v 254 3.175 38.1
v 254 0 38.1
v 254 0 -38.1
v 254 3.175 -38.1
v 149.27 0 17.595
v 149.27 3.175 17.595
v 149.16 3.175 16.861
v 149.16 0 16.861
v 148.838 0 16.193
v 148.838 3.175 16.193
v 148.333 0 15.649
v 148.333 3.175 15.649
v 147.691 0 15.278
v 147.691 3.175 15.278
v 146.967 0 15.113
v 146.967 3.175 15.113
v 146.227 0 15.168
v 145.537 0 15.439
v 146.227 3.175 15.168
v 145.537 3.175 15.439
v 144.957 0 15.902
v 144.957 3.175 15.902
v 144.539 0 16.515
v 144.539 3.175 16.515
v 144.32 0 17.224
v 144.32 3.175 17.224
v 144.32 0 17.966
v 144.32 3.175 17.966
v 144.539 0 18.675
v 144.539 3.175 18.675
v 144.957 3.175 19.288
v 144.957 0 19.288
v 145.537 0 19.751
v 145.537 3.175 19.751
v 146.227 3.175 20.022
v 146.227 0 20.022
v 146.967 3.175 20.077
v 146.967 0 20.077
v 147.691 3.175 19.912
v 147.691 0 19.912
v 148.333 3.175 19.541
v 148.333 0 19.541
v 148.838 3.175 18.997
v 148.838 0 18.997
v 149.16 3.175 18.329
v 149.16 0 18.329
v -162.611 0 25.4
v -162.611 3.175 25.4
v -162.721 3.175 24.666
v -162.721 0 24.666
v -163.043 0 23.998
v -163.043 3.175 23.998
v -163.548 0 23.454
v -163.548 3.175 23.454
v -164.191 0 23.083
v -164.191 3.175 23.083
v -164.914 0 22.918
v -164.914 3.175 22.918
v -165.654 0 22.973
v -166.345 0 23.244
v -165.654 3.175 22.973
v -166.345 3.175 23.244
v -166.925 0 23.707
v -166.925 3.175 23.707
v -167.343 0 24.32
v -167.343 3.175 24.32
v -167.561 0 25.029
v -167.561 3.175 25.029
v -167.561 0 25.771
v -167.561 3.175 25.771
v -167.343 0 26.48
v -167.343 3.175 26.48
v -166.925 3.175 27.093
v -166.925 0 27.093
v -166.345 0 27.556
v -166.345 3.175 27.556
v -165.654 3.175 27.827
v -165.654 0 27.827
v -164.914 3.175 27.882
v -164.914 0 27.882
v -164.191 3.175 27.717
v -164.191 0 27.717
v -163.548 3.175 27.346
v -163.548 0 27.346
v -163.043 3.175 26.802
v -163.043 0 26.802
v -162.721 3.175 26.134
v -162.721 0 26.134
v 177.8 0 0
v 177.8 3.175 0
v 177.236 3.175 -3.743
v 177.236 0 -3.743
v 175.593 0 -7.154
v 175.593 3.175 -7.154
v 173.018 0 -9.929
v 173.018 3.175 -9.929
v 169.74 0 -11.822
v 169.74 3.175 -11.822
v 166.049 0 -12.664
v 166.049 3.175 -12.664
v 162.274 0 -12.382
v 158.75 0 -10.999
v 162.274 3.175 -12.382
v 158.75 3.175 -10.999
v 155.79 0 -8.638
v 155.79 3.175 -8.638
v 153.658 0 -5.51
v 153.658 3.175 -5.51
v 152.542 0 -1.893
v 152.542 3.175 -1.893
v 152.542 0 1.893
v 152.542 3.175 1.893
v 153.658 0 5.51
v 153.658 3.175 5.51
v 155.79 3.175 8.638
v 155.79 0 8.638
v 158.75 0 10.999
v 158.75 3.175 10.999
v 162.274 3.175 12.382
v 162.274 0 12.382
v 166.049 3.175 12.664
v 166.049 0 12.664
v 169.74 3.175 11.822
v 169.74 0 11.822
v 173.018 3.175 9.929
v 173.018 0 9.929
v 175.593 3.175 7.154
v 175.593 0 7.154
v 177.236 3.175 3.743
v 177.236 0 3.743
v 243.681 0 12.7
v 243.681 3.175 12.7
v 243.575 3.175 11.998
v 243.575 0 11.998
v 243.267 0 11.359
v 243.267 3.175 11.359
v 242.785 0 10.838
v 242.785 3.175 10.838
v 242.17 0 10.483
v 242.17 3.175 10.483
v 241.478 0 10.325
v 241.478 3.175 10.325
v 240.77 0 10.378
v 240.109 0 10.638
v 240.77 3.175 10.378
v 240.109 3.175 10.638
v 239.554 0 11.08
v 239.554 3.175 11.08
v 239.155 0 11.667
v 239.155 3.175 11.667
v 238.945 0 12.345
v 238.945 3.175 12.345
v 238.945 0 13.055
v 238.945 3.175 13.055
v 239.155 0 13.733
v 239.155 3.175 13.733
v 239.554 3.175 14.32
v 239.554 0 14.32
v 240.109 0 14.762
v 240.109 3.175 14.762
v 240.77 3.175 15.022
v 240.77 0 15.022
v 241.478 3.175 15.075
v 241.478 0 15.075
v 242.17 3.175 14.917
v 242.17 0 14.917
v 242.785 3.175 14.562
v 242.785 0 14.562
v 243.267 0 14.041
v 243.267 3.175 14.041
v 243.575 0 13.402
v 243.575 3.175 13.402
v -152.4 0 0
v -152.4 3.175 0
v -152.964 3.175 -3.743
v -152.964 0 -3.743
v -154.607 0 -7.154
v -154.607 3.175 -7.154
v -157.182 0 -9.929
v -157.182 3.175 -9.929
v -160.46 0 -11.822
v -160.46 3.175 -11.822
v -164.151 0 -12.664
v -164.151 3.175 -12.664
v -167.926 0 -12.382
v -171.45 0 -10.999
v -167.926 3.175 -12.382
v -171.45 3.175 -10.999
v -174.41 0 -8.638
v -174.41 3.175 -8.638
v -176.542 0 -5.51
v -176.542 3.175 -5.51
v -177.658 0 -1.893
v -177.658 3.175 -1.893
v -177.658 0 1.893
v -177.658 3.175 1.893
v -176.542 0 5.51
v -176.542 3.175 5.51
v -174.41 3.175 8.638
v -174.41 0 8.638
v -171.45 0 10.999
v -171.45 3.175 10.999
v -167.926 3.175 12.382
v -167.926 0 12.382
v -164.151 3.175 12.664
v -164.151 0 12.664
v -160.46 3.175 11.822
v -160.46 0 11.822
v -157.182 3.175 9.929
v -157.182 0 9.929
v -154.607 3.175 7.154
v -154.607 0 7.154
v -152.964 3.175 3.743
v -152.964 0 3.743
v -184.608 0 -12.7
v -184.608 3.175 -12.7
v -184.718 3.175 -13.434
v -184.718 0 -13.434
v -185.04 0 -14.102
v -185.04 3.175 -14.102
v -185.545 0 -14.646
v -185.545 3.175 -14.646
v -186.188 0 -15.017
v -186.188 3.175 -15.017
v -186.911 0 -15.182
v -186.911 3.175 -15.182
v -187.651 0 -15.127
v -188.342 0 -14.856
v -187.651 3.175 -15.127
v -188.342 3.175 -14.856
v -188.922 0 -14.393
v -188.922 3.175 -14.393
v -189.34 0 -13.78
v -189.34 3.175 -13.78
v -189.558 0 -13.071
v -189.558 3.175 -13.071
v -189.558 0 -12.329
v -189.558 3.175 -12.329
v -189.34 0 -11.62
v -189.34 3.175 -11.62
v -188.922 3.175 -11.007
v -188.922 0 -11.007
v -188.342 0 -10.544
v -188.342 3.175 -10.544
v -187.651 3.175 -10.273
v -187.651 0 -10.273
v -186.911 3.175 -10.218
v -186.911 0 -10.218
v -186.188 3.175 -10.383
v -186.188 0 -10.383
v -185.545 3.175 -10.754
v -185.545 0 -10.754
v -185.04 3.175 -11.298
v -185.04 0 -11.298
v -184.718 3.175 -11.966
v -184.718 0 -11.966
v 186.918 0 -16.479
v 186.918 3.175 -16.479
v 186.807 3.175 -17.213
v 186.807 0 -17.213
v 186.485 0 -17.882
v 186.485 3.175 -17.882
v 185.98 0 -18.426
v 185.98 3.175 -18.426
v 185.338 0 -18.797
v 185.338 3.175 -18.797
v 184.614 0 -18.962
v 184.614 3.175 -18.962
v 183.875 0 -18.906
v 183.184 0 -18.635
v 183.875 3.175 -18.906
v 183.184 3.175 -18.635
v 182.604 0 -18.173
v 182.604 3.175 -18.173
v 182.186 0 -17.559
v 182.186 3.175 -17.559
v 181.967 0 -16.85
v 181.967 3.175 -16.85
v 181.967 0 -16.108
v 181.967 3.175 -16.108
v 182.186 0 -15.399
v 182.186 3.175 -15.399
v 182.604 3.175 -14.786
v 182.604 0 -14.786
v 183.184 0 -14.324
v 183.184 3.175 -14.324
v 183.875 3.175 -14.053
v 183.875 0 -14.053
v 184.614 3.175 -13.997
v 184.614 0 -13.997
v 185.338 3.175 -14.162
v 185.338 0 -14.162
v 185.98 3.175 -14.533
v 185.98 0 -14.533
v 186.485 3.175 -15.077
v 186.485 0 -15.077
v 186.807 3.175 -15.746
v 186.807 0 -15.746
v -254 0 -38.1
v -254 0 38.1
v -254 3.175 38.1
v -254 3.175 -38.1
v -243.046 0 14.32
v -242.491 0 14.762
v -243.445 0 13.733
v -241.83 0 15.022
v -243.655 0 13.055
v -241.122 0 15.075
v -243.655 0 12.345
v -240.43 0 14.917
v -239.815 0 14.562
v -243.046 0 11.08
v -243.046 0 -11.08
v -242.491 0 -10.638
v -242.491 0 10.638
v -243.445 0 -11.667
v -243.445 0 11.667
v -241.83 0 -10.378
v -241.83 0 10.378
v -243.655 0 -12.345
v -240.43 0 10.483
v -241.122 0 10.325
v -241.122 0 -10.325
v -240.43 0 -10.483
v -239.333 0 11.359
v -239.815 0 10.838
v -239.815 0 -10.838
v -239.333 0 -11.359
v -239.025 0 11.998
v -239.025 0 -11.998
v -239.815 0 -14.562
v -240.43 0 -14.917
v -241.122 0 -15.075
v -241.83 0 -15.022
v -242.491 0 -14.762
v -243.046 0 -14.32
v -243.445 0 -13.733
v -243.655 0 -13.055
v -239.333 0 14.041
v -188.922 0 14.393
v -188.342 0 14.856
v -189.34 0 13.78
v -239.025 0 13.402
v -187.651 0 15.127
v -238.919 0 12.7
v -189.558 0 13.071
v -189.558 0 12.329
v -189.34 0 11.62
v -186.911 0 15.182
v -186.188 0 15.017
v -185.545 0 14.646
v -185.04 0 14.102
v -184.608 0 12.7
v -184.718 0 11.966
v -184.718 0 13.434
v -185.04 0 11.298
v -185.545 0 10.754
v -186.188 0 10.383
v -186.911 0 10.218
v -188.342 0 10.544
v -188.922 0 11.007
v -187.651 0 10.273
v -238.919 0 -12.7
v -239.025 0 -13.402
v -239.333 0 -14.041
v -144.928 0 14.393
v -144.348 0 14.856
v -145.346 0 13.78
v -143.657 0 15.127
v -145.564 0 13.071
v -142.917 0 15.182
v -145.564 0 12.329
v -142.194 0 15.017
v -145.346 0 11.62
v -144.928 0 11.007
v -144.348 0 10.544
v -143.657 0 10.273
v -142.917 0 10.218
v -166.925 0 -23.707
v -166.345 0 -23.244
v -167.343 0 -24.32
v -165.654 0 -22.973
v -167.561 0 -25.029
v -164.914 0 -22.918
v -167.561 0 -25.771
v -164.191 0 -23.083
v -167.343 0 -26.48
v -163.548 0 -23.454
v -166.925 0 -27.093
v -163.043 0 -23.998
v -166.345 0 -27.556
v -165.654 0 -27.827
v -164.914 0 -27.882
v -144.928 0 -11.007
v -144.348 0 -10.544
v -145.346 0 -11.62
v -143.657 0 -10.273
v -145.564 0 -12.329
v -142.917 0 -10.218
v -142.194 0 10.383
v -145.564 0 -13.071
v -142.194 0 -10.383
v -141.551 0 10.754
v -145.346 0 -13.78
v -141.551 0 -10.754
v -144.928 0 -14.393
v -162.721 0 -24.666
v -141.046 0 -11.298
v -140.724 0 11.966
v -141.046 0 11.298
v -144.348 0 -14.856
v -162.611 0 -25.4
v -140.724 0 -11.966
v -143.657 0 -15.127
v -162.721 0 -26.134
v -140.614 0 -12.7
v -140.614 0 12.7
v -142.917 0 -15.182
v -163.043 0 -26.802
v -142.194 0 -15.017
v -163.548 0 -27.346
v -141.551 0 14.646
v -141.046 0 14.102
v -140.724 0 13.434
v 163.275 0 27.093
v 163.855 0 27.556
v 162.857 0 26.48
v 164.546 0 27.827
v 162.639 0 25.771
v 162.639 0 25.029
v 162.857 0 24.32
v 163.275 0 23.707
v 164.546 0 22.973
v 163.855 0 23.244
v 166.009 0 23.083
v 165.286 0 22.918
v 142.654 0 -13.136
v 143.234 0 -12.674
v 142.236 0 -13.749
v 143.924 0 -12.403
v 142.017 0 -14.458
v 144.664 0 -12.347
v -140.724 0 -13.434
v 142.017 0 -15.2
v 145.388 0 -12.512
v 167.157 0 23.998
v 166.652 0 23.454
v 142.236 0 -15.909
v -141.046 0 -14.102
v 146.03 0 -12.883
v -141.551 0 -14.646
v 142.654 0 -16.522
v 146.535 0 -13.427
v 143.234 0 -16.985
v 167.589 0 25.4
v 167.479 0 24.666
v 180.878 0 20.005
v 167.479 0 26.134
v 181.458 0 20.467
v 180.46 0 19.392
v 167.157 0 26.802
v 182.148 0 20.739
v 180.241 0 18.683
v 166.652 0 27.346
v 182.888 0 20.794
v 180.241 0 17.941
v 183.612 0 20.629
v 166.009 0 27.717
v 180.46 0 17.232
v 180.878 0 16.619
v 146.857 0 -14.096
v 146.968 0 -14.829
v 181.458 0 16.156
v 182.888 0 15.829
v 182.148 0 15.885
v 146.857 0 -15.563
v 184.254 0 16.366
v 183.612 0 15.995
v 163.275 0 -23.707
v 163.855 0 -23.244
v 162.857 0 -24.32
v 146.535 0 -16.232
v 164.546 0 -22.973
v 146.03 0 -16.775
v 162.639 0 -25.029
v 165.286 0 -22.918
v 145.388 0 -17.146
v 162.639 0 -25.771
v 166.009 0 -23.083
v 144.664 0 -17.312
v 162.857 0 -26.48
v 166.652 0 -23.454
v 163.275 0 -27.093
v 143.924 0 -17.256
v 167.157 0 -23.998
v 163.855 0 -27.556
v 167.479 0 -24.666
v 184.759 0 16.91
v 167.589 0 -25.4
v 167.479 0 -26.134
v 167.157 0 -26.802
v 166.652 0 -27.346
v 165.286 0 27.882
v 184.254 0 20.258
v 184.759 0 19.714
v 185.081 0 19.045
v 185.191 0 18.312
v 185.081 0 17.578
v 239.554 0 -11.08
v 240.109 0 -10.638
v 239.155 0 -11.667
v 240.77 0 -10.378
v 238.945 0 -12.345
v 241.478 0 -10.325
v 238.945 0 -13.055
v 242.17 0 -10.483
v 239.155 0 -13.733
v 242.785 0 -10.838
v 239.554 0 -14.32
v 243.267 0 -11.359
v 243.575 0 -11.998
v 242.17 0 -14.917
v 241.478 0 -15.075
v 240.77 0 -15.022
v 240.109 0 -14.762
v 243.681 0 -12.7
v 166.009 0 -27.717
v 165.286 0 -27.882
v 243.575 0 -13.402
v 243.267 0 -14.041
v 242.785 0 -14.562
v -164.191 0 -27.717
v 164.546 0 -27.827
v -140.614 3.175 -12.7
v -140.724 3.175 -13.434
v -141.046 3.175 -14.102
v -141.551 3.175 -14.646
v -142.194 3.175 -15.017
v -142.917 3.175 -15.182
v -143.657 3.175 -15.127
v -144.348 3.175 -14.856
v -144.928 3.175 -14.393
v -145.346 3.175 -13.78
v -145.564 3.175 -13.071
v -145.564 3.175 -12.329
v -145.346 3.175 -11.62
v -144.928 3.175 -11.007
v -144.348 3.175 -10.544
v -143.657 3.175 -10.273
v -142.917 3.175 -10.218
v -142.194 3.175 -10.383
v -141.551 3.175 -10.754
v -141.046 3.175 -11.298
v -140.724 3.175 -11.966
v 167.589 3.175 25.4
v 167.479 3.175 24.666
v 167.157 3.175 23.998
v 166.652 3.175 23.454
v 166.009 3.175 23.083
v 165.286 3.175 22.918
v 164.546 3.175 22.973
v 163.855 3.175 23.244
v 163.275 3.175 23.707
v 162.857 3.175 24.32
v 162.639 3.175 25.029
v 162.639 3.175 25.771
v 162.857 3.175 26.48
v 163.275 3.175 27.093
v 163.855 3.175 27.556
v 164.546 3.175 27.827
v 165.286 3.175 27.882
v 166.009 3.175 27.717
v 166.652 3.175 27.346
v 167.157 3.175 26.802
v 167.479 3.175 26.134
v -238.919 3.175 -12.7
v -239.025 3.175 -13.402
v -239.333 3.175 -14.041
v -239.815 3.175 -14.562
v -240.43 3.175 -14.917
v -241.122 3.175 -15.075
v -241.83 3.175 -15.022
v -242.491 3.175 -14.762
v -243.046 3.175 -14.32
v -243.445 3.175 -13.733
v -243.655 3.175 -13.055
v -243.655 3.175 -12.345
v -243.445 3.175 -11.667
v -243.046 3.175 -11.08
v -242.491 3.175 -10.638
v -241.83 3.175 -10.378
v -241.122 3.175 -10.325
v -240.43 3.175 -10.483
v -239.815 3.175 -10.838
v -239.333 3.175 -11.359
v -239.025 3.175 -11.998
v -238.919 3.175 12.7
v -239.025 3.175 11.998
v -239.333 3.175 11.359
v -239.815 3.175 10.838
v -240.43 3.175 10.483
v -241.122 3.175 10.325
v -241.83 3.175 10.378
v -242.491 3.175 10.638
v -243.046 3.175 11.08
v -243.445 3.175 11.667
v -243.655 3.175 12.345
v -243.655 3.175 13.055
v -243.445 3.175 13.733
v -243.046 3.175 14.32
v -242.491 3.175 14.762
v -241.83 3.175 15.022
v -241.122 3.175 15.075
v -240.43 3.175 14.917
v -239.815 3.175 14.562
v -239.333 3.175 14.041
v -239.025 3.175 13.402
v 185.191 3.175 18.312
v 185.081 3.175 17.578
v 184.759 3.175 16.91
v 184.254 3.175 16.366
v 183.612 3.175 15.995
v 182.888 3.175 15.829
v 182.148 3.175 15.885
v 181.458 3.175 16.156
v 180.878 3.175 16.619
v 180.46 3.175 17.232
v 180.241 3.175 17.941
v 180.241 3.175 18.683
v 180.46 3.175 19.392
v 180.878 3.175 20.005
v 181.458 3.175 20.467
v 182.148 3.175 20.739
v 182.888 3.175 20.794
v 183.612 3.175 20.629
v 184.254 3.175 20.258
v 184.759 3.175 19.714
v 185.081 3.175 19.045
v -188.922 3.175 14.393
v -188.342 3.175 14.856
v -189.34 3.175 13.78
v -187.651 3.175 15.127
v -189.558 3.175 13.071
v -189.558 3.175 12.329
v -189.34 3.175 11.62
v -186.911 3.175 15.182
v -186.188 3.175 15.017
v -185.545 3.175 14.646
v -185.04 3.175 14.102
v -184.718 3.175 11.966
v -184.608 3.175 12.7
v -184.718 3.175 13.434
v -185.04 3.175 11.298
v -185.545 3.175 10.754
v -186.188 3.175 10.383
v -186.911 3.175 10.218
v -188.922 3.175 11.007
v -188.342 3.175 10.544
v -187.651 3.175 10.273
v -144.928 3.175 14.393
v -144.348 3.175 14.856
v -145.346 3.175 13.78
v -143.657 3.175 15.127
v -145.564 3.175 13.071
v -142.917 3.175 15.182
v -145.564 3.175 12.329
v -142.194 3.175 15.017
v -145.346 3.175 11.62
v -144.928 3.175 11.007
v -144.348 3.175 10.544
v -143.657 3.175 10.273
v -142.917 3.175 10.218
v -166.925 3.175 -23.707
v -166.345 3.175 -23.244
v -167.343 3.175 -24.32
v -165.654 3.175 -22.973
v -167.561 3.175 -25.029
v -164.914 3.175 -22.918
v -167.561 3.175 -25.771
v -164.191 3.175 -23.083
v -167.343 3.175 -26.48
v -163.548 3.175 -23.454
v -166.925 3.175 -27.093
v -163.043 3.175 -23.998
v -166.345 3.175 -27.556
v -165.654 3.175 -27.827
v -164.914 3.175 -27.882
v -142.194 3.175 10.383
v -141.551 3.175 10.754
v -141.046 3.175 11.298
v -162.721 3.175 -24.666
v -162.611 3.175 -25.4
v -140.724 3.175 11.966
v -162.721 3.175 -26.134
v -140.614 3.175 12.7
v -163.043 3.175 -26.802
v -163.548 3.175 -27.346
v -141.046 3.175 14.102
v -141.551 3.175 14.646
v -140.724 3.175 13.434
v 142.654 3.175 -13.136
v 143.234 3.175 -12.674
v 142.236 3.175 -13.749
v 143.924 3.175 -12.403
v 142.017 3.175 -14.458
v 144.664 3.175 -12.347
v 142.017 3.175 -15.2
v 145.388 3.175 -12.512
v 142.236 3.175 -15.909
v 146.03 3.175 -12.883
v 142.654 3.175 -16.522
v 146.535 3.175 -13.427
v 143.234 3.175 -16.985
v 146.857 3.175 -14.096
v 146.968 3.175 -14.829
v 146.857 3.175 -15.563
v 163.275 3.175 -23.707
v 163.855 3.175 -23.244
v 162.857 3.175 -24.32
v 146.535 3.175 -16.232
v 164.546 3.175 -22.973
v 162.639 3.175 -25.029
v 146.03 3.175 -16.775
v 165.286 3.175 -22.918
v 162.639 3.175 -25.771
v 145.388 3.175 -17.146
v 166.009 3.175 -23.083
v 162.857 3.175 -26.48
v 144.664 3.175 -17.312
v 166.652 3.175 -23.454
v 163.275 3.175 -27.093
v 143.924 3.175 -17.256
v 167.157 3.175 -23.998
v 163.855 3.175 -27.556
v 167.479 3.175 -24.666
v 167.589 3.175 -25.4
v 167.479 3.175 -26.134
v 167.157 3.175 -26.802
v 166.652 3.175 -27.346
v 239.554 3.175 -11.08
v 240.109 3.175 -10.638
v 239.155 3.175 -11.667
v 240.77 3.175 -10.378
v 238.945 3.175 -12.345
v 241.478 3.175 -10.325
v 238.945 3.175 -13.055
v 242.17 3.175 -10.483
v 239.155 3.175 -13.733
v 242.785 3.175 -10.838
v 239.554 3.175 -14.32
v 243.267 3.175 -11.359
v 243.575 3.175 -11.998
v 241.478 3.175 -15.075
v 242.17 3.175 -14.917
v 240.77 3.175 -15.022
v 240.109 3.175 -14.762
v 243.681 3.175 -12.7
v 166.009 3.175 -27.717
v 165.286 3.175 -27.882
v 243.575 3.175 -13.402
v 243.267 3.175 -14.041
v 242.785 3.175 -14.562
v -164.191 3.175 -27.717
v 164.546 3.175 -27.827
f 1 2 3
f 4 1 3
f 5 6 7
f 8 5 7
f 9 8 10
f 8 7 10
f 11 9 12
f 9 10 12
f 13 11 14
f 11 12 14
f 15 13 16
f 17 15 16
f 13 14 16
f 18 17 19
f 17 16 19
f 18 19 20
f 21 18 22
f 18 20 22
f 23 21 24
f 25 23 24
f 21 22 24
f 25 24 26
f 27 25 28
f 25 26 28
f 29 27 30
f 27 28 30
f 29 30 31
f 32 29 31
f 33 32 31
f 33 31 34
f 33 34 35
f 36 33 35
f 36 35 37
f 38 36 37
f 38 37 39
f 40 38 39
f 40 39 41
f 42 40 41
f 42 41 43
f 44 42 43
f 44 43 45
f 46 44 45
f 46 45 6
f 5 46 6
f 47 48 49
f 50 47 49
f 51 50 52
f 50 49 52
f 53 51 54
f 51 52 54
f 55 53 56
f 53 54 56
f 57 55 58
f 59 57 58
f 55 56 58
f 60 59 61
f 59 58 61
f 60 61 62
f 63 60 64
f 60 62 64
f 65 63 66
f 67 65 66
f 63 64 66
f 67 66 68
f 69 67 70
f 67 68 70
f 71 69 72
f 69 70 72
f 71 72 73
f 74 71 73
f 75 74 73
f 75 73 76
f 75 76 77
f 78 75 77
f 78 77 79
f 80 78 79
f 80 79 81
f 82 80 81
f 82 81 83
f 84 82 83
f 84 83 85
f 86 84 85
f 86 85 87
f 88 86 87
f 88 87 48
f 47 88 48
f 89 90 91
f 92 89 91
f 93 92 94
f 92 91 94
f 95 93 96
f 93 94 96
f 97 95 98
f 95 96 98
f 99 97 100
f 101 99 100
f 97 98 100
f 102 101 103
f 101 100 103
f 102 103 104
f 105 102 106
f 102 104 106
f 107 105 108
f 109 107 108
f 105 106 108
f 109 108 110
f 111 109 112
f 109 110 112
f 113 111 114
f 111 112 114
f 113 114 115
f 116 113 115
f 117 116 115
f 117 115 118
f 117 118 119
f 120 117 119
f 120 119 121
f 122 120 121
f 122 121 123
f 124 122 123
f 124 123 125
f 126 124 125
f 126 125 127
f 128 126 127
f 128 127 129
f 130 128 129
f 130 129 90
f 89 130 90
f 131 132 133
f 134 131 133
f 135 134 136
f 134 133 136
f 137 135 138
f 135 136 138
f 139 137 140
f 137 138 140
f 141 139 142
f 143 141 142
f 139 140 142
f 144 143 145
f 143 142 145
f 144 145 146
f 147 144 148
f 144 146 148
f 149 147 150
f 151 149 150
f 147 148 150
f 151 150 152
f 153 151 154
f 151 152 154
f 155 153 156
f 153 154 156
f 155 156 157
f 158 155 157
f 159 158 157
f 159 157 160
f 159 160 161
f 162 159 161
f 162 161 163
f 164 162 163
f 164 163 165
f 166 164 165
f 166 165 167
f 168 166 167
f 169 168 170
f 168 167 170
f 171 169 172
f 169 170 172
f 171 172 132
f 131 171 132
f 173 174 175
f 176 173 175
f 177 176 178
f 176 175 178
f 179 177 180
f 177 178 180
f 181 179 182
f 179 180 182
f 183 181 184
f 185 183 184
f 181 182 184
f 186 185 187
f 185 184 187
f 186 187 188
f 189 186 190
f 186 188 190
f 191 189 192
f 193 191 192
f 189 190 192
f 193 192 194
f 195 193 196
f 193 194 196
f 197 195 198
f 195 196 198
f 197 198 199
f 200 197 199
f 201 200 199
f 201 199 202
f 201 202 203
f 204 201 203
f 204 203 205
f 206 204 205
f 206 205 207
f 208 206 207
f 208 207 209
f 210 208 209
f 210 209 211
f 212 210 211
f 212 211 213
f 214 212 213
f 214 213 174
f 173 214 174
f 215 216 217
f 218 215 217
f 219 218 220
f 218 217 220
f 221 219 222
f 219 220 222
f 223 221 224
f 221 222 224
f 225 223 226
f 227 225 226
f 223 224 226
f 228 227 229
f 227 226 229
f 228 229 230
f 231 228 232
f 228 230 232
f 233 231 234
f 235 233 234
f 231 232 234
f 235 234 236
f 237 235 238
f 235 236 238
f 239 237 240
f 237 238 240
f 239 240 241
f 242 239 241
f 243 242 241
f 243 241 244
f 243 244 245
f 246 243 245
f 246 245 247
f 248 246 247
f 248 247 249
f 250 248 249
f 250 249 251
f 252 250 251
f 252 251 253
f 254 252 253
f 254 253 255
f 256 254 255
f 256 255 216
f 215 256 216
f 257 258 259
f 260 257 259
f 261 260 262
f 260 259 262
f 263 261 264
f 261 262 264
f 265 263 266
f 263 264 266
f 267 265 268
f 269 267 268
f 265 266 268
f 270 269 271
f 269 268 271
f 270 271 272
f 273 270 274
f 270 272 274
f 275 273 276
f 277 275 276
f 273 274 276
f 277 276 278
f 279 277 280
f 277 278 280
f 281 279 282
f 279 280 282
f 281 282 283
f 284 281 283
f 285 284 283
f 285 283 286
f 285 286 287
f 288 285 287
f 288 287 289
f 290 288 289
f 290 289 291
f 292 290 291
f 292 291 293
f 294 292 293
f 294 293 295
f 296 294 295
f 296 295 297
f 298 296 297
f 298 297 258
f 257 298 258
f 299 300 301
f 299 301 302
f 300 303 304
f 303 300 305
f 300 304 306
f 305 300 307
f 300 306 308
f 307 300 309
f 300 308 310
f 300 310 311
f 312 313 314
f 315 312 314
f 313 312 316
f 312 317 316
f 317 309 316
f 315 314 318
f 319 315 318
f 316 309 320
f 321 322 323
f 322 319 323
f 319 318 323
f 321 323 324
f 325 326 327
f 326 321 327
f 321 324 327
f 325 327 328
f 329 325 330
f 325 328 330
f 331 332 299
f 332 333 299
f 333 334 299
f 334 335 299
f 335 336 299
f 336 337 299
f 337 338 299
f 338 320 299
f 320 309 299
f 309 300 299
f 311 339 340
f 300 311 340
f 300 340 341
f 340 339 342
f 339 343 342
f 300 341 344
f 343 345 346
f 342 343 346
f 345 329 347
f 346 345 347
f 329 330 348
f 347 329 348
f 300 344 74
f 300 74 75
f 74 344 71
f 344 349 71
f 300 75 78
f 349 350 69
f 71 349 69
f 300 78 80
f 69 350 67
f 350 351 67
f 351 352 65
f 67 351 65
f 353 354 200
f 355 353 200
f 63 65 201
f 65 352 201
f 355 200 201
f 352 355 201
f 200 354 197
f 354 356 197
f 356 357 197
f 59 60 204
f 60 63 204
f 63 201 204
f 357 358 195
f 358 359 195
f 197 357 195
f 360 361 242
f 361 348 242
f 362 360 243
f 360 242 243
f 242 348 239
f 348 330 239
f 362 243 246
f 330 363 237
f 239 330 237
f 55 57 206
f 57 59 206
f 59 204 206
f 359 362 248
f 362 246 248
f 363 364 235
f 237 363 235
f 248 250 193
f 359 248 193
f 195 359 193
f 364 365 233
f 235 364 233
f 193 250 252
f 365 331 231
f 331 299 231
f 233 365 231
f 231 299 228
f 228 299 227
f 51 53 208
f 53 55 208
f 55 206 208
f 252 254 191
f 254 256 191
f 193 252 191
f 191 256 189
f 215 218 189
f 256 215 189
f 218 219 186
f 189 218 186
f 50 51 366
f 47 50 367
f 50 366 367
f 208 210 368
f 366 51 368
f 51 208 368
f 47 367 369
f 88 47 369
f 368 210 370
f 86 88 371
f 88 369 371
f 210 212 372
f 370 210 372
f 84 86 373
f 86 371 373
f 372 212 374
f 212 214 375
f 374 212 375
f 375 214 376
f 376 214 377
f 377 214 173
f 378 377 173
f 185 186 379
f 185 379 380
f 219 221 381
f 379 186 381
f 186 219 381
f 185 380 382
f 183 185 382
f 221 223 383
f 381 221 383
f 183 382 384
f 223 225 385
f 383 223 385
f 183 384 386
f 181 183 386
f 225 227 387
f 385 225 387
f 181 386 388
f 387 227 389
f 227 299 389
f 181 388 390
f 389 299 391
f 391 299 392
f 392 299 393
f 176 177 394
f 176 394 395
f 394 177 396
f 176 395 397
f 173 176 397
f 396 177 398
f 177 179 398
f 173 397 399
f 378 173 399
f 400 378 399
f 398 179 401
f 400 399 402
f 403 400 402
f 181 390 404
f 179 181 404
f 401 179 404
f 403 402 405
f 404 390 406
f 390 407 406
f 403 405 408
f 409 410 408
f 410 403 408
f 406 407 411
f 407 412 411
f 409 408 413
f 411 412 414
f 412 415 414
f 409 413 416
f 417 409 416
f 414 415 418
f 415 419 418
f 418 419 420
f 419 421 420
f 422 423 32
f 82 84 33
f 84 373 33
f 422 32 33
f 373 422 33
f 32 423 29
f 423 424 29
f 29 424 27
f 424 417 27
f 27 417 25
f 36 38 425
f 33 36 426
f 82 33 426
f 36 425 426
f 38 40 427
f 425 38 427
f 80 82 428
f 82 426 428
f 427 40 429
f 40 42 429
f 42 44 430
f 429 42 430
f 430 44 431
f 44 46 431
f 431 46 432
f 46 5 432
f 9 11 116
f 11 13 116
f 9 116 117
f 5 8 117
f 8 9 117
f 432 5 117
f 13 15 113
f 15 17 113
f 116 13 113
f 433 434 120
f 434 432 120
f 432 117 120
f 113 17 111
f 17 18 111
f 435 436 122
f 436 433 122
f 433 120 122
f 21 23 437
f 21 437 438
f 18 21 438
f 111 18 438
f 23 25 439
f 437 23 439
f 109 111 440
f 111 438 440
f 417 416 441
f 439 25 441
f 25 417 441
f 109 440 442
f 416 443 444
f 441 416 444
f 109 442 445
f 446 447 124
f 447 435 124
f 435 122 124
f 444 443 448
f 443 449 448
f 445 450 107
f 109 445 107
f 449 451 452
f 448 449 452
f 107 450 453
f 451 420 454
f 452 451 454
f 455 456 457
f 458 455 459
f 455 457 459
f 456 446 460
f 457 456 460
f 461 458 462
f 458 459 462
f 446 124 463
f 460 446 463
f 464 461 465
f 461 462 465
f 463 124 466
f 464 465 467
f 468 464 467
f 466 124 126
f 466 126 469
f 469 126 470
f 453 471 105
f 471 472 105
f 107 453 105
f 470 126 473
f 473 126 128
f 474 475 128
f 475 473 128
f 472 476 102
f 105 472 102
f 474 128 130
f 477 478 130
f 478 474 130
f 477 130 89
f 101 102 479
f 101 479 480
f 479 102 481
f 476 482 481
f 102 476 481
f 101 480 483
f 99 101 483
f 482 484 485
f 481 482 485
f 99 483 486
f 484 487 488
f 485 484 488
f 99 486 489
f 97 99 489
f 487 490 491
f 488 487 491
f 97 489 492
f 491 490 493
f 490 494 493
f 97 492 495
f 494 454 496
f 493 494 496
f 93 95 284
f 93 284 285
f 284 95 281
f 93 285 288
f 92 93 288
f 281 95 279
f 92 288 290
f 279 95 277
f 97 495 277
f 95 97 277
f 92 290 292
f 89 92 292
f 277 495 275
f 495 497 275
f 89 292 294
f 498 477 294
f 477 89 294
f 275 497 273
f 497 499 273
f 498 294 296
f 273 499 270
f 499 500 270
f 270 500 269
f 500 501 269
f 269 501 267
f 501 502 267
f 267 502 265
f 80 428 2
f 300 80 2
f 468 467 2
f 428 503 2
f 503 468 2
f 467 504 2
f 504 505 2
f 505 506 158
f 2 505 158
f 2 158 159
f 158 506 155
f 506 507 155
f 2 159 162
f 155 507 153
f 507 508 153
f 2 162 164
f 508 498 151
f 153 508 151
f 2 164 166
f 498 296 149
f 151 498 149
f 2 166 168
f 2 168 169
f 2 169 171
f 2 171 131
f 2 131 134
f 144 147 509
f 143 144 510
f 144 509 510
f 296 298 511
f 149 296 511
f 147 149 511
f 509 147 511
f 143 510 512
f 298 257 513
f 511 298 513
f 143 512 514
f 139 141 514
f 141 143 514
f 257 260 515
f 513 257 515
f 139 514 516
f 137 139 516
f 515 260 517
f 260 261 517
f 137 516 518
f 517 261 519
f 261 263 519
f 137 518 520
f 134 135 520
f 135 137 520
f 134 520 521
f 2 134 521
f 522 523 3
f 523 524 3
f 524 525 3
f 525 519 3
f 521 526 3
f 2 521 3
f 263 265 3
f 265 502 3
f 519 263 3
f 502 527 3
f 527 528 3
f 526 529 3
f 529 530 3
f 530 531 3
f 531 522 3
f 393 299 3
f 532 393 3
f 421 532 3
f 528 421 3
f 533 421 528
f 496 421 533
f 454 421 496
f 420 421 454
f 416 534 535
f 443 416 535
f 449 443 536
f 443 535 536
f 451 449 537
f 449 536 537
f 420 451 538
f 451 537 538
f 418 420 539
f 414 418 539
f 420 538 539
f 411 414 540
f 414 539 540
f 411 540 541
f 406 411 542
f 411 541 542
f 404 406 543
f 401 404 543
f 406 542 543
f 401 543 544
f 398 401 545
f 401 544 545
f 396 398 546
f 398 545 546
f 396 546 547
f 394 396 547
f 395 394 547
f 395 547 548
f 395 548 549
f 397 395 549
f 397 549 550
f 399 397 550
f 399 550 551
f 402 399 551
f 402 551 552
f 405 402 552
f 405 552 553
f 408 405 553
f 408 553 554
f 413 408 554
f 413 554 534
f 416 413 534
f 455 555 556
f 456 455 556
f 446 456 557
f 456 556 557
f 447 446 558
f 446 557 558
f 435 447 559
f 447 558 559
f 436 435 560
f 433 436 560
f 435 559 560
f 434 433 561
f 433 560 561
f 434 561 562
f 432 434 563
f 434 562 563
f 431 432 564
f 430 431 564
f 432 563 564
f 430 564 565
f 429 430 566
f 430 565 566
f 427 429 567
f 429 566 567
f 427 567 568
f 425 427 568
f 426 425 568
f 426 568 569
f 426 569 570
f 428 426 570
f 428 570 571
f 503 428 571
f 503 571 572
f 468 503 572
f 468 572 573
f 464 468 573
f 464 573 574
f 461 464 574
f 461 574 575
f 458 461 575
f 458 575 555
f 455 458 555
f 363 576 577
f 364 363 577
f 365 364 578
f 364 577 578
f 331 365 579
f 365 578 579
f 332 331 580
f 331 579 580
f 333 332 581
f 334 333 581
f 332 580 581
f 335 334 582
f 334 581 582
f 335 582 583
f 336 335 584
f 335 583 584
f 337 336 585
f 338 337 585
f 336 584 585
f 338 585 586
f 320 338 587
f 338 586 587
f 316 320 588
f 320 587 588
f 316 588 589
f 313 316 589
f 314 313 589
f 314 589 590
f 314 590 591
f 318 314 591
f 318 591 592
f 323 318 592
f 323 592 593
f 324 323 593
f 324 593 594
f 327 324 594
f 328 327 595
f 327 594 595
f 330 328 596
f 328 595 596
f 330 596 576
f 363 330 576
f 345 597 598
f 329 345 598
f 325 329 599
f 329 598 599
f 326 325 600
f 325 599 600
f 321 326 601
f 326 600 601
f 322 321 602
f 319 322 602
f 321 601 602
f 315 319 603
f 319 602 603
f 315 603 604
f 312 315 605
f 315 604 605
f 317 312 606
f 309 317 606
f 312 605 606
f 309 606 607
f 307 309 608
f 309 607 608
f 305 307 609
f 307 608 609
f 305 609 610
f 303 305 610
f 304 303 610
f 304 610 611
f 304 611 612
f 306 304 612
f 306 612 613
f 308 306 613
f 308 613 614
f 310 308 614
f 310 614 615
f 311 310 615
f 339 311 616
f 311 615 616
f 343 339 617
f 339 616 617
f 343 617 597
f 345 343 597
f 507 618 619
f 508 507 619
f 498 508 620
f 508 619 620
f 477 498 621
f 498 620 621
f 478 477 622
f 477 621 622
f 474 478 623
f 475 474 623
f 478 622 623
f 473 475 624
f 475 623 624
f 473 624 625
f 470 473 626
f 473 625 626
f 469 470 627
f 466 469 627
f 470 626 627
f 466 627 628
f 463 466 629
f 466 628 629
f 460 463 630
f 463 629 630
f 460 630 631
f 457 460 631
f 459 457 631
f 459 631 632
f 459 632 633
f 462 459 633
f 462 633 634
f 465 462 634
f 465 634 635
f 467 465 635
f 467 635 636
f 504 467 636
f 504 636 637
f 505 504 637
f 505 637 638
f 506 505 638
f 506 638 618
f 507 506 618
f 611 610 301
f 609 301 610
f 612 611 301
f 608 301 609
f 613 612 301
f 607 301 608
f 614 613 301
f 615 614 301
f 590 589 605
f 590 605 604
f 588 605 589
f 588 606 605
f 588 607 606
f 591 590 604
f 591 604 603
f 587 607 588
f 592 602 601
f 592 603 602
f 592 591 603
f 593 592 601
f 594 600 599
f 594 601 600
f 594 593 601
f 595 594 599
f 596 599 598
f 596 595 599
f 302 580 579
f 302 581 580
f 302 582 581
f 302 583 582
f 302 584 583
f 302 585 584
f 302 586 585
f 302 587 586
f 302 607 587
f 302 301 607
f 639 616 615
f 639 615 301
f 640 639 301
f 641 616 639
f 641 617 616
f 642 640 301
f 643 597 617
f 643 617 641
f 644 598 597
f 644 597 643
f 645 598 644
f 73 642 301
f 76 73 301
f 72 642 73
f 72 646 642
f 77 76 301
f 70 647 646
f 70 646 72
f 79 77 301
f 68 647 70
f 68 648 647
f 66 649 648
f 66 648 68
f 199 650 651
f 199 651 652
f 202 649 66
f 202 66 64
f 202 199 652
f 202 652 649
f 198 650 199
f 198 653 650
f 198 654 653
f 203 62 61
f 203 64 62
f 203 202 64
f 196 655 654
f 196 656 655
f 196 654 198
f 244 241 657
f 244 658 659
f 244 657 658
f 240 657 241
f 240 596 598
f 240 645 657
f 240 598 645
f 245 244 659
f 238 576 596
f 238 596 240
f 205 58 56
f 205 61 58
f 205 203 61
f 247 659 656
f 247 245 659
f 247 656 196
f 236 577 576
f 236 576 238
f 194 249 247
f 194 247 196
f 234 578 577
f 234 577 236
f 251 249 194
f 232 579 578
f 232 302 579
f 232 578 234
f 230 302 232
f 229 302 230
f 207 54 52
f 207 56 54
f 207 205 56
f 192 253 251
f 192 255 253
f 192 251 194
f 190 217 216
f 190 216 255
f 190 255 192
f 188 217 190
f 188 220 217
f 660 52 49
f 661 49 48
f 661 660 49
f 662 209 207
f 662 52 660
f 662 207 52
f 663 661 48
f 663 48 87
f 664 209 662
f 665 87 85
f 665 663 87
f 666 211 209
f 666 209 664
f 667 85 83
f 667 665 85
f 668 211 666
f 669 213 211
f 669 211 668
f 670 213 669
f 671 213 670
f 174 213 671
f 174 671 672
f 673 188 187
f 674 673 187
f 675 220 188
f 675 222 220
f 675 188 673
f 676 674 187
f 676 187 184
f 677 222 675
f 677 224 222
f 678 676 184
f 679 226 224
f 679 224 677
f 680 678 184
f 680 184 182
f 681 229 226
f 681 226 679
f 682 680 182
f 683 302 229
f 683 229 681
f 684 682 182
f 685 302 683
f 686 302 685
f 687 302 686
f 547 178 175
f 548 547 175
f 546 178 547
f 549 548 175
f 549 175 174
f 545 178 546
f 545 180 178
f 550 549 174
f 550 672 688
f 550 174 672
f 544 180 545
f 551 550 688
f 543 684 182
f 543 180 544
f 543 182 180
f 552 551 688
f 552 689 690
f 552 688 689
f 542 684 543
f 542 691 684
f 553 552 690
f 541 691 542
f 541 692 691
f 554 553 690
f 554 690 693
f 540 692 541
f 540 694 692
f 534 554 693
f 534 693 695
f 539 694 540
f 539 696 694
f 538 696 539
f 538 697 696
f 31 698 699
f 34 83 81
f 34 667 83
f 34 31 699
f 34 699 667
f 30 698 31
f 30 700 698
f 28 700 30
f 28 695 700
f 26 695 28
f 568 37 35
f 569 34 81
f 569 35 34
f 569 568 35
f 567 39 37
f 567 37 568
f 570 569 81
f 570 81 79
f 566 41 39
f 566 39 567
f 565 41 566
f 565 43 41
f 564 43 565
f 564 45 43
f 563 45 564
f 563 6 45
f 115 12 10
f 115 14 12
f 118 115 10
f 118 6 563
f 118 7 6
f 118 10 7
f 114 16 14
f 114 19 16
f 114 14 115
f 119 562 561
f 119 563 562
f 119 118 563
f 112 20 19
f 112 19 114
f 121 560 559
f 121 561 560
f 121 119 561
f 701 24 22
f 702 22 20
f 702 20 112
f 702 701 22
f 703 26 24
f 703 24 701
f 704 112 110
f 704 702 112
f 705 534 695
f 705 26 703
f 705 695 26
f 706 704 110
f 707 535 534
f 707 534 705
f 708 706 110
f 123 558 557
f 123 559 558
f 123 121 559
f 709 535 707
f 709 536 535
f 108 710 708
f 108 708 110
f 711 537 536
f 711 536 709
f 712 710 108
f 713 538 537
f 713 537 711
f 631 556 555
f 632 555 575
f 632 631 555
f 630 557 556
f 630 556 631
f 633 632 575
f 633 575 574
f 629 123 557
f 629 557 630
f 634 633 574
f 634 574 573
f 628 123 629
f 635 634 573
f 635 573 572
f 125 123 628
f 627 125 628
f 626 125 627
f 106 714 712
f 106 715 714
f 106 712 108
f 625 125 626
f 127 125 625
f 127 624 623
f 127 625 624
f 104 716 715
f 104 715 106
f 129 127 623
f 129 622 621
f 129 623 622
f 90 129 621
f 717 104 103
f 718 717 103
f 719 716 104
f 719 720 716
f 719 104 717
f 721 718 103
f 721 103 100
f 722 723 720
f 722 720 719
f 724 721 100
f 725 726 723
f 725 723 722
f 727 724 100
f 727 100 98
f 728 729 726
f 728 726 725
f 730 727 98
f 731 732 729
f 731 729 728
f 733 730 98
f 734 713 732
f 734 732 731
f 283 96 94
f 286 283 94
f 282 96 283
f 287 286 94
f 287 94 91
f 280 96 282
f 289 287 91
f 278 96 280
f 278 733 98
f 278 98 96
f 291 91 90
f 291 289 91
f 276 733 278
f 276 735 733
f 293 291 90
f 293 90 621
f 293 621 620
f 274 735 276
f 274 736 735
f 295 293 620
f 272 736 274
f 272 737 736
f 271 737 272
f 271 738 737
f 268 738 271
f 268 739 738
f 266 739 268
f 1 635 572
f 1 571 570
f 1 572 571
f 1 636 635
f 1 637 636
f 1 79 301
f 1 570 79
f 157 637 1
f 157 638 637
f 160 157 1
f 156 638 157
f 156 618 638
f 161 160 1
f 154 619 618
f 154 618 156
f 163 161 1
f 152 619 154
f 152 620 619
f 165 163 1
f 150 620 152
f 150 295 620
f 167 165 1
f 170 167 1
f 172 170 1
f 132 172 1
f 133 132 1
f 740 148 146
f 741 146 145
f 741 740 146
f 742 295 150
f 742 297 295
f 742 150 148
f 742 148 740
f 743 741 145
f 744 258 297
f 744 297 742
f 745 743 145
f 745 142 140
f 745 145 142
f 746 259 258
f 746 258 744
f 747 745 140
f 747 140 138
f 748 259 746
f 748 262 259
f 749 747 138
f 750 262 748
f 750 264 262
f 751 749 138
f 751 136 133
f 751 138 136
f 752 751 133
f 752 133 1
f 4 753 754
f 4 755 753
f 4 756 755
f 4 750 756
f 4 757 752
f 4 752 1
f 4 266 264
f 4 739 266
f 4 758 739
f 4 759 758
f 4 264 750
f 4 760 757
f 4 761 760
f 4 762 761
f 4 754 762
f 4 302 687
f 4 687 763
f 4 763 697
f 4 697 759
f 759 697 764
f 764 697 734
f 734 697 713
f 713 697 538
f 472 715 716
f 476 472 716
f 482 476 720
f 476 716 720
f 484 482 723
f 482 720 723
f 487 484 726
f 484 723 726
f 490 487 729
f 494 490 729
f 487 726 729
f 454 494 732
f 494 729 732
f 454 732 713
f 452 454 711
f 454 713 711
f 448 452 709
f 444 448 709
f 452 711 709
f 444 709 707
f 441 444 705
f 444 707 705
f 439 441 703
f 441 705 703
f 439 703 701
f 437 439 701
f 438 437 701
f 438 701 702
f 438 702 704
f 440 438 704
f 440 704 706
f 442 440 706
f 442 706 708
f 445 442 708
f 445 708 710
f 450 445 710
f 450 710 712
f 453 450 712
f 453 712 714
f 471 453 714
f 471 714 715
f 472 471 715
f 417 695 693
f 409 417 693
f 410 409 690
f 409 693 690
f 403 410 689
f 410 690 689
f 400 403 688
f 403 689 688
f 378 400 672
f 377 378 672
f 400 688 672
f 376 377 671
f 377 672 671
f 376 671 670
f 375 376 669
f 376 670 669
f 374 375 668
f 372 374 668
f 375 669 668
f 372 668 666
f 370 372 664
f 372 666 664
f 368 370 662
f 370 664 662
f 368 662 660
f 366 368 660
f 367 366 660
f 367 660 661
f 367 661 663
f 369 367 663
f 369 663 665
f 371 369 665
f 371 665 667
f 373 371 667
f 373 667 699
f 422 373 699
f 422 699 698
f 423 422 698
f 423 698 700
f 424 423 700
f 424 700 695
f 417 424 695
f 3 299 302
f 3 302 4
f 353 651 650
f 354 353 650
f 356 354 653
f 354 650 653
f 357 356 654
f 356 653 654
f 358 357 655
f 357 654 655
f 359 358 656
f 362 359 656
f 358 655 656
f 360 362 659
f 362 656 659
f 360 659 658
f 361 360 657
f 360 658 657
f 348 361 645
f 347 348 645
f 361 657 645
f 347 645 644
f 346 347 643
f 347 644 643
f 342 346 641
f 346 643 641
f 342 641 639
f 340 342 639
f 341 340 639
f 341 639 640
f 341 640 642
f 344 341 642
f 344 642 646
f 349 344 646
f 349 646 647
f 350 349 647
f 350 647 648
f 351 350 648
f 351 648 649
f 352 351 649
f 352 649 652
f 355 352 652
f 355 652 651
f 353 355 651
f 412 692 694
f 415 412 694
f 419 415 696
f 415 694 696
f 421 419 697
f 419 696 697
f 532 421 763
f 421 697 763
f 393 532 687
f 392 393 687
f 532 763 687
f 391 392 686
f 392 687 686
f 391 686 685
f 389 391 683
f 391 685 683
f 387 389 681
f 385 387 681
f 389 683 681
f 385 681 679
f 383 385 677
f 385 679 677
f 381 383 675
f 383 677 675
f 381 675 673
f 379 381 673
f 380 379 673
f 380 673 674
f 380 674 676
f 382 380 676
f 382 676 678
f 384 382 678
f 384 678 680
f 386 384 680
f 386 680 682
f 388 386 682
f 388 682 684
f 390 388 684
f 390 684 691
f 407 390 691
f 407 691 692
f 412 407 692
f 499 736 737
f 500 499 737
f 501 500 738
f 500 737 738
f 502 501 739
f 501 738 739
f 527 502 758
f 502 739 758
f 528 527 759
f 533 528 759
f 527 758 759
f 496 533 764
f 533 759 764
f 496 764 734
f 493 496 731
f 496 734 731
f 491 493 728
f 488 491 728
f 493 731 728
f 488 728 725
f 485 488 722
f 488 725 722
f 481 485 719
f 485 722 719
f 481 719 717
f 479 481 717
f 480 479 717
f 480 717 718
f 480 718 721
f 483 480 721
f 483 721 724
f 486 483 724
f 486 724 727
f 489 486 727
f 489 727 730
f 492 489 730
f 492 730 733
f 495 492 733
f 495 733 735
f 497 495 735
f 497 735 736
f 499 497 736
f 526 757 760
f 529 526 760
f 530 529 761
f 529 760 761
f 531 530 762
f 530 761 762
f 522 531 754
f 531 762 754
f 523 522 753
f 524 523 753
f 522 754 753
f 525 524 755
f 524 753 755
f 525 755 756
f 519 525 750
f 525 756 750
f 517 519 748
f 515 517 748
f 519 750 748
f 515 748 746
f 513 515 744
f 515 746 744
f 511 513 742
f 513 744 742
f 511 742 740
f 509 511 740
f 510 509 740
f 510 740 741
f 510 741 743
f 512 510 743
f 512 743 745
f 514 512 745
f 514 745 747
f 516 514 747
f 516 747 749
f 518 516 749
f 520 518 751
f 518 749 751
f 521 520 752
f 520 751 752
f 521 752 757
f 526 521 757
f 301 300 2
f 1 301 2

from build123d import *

# Parameters (mm, degrees)
SKETCH1_W               = 508
SKETCH1_H               = 76.2
BOSS_EXTRUDE1_DEPTH     = 3.175
SKETCH3_R               = 2.38125
CUT_EXTRUDE2_DEPTH      = 3.175
SKETCH4_R               = 12.7
CUT_EXTRUDE3_DEPTH      = 1
CUT_EXTRUDE3_DEPTH_BACK = 4.175
SKETCH5_R               = 2.4892
CUT_EXTRUDE4_DEPTH      = 1
CUT_EXTRUDE4_DEPTH_BACK = 4.175


with BuildPart() as part:
    # Sketch1 → Boss-Extrude1 (new body)
    with BuildSketch(Plane(origin=(0, 0, 0), x_dir=(1, 0, 0), z_dir=(0, 1, 0))):
        Rectangle(SKETCH1_W, SKETCH1_H)
    extrude(amount=BOSS_EXTRUDE1_DEPTH)

    # Sketch3 → Cut-Extrude2 (cut)
    with BuildSketch(Plane(origin=(0, 3.175, 0), x_dir=(1, 0, 0), z_dir=(0, 1, 0))):
        with Locations((-241.3, 12.7)):
            Circle(SKETCH3_R)
        with Locations((-241.3, -12.7)):
            Circle(SKETCH3_R)
        with Locations((241.3, -12.7)):
            Circle(SKETCH3_R)
        with Locations((241.3, 12.7)):
            Circle(SKETCH3_R)
    extrude(amount=-CUT_EXTRUDE2_DEPTH, mode=Mode.SUBTRACT)

    # Sketch4 → Cut-Extrude3 (cut, two sides)
    with BuildSketch(Plane(origin=(0, 3.175, 0), x_dir=(1, 0, 0), z_dir=(0, 1, 0))) as cut_extrude3_sk:
        with Locations((-165.1, 0)):
            Circle(SKETCH4_R)
        with Locations((165.1, 0)):
            Circle(SKETCH4_R)
    extrude(amount=CUT_EXTRUDE3_DEPTH, mode=Mode.SUBTRACT)
    extrude(cut_extrude3_sk.sketch, amount=-CUT_EXTRUDE3_DEPTH_BACK, mode=Mode.SUBTRACT)

    # Sketch5 → Cut-Extrude4 (cut, two sides)
    with BuildSketch(Plane(origin=(0, 3.175, 0), x_dir=(1, 0, 0), z_dir=(0, 1, 0))) as cut_extrude4_sk:
        with Locations((165.1, 25.4)):
            Circle(SKETCH5_R)
        with Locations((165.1, -25.4)):
            Circle(SKETCH5_R)
        with Locations((182.702284282, -18.311733617)):
            Circle(SKETCH5_R)
        with Locations((146.781232197, -17.594963659)):
            Circle(SKETCH5_R)
        with Locations((144.478364545, 14.829300427)):
            Circle(SKETCH5_R)
        with Locations((184.428439169, 16.479424725)):
            Circle(SKETCH5_R)
        with Locations((-165.1, 25.4)):
            Circle(SKETCH5_R)
        with Locations((-165.1, -25.4)):
            Circle(SKETCH5_R)
        with Locations((-143.102954744, -12.7)):
            Circle(SKETCH5_R)
        with Locations((-143.102954744, 12.7)):
            Circle(SKETCH5_R)
        with Locations((-187.097045256, 12.7)):
            Circle(SKETCH5_R)
        with Locations((-187.097045256, -12.7)):
            Circle(SKETCH5_R)
    extrude(amount=CUT_EXTRUDE4_DEPTH, mode=Mode.SUBTRACT)
    extrude(cut_extrude4_sk.sketch, amount=-CUT_EXTRUDE4_DEPTH_BACK, mode=Mode.SUBTRACT)


solid = part.part
